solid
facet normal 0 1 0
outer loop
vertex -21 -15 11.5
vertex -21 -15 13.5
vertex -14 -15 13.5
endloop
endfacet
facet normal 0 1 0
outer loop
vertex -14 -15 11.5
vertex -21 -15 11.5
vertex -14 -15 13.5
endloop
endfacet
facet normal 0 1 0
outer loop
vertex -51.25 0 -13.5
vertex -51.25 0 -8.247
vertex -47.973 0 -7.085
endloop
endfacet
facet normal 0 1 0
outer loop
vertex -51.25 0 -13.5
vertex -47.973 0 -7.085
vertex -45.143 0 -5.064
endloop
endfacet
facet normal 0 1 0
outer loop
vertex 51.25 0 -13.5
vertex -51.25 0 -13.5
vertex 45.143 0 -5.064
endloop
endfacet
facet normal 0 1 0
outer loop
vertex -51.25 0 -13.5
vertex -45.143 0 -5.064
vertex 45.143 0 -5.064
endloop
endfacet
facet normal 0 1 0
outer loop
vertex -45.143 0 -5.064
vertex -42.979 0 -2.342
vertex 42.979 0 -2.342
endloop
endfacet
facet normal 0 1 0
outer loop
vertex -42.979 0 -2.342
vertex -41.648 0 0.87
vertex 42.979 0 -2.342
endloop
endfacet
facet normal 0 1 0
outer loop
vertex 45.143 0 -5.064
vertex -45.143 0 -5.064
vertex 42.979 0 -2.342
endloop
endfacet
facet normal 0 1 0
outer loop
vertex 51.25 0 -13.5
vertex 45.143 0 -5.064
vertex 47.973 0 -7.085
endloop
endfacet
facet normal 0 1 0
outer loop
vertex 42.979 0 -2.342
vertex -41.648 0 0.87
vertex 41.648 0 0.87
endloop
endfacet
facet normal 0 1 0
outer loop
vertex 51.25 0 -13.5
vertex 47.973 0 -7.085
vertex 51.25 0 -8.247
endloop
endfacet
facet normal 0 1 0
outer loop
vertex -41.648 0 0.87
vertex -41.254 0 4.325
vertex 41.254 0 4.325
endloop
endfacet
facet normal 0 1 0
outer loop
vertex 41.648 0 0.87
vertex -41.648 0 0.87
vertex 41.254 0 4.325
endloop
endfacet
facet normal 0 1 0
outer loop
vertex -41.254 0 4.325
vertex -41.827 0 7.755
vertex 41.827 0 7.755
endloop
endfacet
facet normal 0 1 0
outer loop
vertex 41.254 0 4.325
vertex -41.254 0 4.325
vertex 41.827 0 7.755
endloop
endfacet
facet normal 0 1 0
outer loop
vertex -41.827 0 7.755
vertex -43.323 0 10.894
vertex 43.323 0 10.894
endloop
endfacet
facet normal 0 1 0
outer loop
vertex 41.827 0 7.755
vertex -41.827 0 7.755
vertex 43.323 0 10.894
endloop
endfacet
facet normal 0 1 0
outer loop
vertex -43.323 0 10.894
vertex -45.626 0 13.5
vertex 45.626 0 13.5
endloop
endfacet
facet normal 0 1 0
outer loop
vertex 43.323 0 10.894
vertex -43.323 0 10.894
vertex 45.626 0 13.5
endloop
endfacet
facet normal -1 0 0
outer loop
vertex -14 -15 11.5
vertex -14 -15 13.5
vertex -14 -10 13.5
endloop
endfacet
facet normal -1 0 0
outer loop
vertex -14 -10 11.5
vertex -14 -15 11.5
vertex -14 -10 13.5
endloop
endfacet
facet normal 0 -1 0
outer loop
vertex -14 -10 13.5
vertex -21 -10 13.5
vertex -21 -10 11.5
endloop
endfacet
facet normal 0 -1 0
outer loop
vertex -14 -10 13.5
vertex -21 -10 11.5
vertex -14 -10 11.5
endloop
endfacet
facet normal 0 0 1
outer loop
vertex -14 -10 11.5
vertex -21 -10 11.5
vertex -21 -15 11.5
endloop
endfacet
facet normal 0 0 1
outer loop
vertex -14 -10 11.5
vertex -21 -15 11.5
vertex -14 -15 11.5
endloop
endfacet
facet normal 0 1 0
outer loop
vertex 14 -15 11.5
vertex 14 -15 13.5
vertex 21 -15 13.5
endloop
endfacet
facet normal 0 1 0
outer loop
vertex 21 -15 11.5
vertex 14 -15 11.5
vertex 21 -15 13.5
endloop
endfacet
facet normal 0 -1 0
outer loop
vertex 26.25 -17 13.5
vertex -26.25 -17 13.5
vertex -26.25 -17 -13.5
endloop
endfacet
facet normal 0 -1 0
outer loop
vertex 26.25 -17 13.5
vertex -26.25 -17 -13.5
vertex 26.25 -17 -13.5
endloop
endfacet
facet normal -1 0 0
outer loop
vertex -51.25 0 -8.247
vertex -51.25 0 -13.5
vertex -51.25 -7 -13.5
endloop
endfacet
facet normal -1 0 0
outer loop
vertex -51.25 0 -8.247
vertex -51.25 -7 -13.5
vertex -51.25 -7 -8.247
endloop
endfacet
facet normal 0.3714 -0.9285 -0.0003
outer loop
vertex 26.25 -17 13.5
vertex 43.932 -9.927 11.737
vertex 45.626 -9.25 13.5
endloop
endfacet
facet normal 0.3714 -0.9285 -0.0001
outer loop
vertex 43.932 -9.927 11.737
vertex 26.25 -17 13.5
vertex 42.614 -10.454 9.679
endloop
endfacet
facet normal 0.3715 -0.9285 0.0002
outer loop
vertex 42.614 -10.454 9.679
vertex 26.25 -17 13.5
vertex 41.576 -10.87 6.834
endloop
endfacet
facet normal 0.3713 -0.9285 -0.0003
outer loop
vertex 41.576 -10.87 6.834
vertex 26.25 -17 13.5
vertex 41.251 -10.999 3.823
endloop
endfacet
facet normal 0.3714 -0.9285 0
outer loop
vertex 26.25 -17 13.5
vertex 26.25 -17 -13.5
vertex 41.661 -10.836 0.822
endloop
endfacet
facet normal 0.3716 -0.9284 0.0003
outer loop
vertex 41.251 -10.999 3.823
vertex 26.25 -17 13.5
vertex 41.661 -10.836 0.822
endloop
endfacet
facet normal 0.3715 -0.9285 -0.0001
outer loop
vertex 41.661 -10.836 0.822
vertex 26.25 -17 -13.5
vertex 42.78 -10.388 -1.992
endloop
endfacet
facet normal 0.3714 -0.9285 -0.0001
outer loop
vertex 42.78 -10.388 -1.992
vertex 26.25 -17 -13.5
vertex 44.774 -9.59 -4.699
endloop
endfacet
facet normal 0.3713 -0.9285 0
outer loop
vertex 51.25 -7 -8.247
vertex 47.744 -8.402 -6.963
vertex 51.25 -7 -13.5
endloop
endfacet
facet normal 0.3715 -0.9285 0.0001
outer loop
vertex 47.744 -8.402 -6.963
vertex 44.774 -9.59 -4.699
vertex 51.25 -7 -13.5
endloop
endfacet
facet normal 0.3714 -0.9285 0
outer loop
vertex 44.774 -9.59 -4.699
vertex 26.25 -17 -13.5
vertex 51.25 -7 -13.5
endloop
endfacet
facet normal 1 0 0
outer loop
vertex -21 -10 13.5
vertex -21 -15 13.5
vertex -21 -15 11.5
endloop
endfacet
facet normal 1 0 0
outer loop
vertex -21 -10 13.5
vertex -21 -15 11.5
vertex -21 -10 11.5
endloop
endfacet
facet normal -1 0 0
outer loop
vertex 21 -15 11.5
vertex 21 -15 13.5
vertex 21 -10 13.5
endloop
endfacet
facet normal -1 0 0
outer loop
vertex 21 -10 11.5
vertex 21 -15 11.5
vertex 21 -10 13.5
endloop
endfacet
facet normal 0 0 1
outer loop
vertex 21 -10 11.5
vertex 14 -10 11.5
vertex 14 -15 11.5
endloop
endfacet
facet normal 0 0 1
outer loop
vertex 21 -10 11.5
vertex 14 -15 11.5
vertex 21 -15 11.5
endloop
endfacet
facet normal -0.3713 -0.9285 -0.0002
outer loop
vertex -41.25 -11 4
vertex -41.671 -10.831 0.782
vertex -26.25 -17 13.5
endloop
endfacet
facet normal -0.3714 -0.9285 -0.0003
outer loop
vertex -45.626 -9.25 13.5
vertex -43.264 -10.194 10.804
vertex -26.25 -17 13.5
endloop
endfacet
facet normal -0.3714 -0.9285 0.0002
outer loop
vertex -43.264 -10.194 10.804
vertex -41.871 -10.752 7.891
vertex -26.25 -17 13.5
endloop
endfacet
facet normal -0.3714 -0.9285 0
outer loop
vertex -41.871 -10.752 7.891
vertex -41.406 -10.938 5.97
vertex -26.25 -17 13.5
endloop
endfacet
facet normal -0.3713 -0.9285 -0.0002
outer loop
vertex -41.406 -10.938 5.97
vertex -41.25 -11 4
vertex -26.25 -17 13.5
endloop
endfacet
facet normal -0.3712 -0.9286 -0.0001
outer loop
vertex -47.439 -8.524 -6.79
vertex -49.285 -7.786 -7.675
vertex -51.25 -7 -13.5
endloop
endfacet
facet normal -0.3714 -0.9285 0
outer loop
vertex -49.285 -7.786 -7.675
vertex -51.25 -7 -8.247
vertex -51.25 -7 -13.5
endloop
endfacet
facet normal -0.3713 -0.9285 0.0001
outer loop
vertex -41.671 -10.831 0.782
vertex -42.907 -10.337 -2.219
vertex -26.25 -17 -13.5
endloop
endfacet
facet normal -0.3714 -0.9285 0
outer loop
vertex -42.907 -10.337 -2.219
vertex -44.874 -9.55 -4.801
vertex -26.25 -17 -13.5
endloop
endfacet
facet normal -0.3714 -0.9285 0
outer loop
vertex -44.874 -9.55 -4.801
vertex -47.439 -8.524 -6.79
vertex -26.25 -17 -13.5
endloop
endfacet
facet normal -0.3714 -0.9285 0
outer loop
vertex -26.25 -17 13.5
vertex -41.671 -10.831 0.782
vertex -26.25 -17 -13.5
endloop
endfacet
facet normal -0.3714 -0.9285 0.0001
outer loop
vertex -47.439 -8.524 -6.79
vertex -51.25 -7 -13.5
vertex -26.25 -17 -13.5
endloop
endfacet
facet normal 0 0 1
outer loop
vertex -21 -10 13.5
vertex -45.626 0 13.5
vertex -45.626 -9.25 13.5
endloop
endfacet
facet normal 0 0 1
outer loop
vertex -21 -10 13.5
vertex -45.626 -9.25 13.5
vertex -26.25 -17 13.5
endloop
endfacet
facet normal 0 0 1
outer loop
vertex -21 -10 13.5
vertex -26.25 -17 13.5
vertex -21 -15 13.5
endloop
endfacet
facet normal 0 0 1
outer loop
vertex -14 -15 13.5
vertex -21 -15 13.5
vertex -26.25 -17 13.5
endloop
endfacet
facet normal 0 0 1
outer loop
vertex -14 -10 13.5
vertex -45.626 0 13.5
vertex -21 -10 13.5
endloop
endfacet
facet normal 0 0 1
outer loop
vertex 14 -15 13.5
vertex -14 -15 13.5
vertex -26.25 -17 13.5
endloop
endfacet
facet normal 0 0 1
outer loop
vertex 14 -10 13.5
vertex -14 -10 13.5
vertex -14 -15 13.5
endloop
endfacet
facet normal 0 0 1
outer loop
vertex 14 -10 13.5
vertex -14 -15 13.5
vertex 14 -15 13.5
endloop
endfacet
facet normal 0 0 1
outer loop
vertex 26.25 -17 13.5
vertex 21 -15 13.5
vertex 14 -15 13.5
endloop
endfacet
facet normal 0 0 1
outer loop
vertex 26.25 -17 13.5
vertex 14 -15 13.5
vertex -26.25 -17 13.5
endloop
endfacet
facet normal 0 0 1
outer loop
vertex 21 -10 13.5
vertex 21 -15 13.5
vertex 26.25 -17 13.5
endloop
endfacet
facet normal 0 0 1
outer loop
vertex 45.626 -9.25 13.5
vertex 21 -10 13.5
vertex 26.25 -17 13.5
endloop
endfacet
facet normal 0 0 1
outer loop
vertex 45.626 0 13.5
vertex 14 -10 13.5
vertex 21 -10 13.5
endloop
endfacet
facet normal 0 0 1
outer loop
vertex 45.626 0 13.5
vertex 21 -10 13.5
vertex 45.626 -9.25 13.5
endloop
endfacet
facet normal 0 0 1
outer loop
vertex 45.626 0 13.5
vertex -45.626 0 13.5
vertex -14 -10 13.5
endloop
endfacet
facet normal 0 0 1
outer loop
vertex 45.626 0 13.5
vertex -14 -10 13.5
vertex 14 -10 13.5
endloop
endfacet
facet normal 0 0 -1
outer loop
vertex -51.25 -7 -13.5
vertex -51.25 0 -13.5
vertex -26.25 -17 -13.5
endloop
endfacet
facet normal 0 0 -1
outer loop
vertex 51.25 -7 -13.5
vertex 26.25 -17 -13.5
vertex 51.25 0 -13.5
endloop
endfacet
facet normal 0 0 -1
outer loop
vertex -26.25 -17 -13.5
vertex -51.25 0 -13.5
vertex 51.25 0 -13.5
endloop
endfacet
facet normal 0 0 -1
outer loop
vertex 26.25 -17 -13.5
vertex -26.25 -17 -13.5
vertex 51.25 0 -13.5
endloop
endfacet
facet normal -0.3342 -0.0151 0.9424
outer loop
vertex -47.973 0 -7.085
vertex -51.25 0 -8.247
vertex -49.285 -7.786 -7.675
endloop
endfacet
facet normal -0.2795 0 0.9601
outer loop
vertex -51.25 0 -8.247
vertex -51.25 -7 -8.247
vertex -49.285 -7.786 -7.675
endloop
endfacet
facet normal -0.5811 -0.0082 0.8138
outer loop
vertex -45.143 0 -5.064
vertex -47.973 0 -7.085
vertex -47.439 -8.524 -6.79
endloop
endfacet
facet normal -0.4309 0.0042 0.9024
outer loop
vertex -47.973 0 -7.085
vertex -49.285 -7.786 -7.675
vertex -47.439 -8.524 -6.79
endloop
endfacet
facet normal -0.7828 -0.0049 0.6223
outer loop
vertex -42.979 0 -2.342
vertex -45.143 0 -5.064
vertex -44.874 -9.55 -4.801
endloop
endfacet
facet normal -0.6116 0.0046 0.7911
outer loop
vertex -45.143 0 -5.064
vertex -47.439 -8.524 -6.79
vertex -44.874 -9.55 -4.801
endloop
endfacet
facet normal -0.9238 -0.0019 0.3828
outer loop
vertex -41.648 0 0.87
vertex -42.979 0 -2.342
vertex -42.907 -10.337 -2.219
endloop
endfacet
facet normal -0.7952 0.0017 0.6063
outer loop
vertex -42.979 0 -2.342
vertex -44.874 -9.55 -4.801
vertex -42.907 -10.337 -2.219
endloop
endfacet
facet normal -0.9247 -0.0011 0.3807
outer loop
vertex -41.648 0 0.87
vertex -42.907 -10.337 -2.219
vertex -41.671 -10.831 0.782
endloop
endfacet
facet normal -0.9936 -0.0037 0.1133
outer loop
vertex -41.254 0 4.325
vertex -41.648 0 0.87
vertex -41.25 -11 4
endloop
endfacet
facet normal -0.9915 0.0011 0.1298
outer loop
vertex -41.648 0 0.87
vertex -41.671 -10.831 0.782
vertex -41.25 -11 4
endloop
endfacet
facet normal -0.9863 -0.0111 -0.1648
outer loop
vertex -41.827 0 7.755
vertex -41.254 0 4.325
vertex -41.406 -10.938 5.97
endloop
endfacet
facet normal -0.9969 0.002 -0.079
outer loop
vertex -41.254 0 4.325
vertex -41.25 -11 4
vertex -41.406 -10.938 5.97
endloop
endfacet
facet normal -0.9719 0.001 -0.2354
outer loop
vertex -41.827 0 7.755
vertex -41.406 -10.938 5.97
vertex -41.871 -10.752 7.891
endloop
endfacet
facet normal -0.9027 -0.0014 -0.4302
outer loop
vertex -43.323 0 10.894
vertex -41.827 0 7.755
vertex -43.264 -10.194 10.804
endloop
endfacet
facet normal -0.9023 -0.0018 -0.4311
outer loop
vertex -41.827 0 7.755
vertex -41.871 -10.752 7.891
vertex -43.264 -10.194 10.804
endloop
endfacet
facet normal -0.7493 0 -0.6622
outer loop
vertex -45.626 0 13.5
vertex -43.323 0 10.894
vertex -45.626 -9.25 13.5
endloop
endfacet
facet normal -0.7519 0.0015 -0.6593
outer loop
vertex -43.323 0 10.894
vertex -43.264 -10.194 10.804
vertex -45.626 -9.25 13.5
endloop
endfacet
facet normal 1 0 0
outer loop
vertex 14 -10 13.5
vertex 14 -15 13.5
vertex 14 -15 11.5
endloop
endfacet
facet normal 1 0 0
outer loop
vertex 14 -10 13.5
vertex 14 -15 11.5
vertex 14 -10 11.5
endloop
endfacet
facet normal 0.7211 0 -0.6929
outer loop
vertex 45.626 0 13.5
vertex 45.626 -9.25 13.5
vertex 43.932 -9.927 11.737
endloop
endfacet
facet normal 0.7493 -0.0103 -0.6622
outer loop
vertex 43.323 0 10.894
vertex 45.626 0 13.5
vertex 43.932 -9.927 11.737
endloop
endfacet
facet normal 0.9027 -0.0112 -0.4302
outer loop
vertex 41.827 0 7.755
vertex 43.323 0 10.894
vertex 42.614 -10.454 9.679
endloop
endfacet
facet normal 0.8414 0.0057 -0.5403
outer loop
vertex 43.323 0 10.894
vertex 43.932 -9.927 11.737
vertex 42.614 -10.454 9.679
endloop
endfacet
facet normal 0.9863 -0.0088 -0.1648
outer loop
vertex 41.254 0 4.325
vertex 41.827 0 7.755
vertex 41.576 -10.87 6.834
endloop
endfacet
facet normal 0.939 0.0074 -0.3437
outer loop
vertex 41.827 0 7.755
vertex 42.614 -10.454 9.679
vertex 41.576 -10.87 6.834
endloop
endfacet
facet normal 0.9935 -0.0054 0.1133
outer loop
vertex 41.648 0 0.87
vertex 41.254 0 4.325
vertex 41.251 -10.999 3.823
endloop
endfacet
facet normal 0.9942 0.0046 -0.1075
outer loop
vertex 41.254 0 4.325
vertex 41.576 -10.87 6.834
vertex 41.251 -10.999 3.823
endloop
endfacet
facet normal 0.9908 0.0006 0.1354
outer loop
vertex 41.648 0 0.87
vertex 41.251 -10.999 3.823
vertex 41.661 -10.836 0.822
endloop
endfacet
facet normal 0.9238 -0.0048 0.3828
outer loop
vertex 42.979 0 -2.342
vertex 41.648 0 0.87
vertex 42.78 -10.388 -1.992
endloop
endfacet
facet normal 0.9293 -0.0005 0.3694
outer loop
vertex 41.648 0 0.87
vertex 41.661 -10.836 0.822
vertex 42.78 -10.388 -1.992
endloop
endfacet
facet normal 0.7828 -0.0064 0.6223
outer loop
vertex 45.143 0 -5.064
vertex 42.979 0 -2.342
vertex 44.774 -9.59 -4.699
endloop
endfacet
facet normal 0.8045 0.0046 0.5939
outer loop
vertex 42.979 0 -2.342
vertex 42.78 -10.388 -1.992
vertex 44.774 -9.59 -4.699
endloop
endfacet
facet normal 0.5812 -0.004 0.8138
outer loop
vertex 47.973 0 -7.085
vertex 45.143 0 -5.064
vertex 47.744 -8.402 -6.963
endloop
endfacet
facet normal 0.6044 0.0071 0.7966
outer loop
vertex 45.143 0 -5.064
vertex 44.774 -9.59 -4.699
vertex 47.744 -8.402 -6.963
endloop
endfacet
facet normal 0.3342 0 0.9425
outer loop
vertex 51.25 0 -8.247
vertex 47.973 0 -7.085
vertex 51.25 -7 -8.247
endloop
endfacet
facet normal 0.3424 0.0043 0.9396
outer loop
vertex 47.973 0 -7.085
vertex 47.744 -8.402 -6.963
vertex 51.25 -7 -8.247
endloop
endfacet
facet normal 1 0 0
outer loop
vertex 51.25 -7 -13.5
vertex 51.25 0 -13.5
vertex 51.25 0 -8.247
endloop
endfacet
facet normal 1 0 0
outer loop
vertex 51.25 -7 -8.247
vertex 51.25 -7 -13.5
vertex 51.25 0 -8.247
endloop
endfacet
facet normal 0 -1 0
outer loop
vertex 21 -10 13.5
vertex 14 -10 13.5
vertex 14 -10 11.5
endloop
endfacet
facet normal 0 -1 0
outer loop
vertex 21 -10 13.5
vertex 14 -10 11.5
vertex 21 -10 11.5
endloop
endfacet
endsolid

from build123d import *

# Parameters (mm, degrees)
F0_W     = 102.5
F0_H     = 27
F1_DEPTH = 17
F3_DEPTH = 190
F4_R     = 12.5
F5_DEPTH = 25
F6_W     = 7
F6_H     = 5
F7_DEPTH = 2


with BuildPart() as f1:
    # F0 (on Front) → F1 (new body)
    with BuildSketch(Plane.XZ):
        Rectangle(F0_W, F0_H)
    extrude(amount=F1_DEPTH)

    # F2 (on face) → F3 (cut)
    with BuildSketch(Plane(origin=(0, 0, -13.5), x_dir=(1, 0, 0), z_dir=(0, 0, -1))):
        Polygon((-51.25, 7), (-26.25, 17), (-51.25, 17), align=None)
        Polygon((51.25, 17), (26.25, 17), (51.25, 7), align=None)
    extrude(amount=-F3_DEPTH, mode=Mode.SUBTRACT)

    # F4 (on face) → F5 (cut)
    with BuildSketch(Plane.XZ.offset(17)):
        with Locations((-53.75, 4)):
            Circle(F4_R)
        with Locations((53.75, 4)):
            Circle(F4_R)
    extrude(amount=-F5_DEPTH, mode=Mode.SUBTRACT)

    # F6 (on face) → F7 (cut)
    with BuildSketch(Plane.XY.offset(13.5)):
        with Locations((17.5, -12.5)):
            Rectangle(F6_W, F6_H)
        with Locations((-17.5, -12.5)):
            Rectangle(F6_W, F6_H)
    extrude(amount=-F7_DEPTH, mode=Mode.SUBTRACT)


solid = f1.part
